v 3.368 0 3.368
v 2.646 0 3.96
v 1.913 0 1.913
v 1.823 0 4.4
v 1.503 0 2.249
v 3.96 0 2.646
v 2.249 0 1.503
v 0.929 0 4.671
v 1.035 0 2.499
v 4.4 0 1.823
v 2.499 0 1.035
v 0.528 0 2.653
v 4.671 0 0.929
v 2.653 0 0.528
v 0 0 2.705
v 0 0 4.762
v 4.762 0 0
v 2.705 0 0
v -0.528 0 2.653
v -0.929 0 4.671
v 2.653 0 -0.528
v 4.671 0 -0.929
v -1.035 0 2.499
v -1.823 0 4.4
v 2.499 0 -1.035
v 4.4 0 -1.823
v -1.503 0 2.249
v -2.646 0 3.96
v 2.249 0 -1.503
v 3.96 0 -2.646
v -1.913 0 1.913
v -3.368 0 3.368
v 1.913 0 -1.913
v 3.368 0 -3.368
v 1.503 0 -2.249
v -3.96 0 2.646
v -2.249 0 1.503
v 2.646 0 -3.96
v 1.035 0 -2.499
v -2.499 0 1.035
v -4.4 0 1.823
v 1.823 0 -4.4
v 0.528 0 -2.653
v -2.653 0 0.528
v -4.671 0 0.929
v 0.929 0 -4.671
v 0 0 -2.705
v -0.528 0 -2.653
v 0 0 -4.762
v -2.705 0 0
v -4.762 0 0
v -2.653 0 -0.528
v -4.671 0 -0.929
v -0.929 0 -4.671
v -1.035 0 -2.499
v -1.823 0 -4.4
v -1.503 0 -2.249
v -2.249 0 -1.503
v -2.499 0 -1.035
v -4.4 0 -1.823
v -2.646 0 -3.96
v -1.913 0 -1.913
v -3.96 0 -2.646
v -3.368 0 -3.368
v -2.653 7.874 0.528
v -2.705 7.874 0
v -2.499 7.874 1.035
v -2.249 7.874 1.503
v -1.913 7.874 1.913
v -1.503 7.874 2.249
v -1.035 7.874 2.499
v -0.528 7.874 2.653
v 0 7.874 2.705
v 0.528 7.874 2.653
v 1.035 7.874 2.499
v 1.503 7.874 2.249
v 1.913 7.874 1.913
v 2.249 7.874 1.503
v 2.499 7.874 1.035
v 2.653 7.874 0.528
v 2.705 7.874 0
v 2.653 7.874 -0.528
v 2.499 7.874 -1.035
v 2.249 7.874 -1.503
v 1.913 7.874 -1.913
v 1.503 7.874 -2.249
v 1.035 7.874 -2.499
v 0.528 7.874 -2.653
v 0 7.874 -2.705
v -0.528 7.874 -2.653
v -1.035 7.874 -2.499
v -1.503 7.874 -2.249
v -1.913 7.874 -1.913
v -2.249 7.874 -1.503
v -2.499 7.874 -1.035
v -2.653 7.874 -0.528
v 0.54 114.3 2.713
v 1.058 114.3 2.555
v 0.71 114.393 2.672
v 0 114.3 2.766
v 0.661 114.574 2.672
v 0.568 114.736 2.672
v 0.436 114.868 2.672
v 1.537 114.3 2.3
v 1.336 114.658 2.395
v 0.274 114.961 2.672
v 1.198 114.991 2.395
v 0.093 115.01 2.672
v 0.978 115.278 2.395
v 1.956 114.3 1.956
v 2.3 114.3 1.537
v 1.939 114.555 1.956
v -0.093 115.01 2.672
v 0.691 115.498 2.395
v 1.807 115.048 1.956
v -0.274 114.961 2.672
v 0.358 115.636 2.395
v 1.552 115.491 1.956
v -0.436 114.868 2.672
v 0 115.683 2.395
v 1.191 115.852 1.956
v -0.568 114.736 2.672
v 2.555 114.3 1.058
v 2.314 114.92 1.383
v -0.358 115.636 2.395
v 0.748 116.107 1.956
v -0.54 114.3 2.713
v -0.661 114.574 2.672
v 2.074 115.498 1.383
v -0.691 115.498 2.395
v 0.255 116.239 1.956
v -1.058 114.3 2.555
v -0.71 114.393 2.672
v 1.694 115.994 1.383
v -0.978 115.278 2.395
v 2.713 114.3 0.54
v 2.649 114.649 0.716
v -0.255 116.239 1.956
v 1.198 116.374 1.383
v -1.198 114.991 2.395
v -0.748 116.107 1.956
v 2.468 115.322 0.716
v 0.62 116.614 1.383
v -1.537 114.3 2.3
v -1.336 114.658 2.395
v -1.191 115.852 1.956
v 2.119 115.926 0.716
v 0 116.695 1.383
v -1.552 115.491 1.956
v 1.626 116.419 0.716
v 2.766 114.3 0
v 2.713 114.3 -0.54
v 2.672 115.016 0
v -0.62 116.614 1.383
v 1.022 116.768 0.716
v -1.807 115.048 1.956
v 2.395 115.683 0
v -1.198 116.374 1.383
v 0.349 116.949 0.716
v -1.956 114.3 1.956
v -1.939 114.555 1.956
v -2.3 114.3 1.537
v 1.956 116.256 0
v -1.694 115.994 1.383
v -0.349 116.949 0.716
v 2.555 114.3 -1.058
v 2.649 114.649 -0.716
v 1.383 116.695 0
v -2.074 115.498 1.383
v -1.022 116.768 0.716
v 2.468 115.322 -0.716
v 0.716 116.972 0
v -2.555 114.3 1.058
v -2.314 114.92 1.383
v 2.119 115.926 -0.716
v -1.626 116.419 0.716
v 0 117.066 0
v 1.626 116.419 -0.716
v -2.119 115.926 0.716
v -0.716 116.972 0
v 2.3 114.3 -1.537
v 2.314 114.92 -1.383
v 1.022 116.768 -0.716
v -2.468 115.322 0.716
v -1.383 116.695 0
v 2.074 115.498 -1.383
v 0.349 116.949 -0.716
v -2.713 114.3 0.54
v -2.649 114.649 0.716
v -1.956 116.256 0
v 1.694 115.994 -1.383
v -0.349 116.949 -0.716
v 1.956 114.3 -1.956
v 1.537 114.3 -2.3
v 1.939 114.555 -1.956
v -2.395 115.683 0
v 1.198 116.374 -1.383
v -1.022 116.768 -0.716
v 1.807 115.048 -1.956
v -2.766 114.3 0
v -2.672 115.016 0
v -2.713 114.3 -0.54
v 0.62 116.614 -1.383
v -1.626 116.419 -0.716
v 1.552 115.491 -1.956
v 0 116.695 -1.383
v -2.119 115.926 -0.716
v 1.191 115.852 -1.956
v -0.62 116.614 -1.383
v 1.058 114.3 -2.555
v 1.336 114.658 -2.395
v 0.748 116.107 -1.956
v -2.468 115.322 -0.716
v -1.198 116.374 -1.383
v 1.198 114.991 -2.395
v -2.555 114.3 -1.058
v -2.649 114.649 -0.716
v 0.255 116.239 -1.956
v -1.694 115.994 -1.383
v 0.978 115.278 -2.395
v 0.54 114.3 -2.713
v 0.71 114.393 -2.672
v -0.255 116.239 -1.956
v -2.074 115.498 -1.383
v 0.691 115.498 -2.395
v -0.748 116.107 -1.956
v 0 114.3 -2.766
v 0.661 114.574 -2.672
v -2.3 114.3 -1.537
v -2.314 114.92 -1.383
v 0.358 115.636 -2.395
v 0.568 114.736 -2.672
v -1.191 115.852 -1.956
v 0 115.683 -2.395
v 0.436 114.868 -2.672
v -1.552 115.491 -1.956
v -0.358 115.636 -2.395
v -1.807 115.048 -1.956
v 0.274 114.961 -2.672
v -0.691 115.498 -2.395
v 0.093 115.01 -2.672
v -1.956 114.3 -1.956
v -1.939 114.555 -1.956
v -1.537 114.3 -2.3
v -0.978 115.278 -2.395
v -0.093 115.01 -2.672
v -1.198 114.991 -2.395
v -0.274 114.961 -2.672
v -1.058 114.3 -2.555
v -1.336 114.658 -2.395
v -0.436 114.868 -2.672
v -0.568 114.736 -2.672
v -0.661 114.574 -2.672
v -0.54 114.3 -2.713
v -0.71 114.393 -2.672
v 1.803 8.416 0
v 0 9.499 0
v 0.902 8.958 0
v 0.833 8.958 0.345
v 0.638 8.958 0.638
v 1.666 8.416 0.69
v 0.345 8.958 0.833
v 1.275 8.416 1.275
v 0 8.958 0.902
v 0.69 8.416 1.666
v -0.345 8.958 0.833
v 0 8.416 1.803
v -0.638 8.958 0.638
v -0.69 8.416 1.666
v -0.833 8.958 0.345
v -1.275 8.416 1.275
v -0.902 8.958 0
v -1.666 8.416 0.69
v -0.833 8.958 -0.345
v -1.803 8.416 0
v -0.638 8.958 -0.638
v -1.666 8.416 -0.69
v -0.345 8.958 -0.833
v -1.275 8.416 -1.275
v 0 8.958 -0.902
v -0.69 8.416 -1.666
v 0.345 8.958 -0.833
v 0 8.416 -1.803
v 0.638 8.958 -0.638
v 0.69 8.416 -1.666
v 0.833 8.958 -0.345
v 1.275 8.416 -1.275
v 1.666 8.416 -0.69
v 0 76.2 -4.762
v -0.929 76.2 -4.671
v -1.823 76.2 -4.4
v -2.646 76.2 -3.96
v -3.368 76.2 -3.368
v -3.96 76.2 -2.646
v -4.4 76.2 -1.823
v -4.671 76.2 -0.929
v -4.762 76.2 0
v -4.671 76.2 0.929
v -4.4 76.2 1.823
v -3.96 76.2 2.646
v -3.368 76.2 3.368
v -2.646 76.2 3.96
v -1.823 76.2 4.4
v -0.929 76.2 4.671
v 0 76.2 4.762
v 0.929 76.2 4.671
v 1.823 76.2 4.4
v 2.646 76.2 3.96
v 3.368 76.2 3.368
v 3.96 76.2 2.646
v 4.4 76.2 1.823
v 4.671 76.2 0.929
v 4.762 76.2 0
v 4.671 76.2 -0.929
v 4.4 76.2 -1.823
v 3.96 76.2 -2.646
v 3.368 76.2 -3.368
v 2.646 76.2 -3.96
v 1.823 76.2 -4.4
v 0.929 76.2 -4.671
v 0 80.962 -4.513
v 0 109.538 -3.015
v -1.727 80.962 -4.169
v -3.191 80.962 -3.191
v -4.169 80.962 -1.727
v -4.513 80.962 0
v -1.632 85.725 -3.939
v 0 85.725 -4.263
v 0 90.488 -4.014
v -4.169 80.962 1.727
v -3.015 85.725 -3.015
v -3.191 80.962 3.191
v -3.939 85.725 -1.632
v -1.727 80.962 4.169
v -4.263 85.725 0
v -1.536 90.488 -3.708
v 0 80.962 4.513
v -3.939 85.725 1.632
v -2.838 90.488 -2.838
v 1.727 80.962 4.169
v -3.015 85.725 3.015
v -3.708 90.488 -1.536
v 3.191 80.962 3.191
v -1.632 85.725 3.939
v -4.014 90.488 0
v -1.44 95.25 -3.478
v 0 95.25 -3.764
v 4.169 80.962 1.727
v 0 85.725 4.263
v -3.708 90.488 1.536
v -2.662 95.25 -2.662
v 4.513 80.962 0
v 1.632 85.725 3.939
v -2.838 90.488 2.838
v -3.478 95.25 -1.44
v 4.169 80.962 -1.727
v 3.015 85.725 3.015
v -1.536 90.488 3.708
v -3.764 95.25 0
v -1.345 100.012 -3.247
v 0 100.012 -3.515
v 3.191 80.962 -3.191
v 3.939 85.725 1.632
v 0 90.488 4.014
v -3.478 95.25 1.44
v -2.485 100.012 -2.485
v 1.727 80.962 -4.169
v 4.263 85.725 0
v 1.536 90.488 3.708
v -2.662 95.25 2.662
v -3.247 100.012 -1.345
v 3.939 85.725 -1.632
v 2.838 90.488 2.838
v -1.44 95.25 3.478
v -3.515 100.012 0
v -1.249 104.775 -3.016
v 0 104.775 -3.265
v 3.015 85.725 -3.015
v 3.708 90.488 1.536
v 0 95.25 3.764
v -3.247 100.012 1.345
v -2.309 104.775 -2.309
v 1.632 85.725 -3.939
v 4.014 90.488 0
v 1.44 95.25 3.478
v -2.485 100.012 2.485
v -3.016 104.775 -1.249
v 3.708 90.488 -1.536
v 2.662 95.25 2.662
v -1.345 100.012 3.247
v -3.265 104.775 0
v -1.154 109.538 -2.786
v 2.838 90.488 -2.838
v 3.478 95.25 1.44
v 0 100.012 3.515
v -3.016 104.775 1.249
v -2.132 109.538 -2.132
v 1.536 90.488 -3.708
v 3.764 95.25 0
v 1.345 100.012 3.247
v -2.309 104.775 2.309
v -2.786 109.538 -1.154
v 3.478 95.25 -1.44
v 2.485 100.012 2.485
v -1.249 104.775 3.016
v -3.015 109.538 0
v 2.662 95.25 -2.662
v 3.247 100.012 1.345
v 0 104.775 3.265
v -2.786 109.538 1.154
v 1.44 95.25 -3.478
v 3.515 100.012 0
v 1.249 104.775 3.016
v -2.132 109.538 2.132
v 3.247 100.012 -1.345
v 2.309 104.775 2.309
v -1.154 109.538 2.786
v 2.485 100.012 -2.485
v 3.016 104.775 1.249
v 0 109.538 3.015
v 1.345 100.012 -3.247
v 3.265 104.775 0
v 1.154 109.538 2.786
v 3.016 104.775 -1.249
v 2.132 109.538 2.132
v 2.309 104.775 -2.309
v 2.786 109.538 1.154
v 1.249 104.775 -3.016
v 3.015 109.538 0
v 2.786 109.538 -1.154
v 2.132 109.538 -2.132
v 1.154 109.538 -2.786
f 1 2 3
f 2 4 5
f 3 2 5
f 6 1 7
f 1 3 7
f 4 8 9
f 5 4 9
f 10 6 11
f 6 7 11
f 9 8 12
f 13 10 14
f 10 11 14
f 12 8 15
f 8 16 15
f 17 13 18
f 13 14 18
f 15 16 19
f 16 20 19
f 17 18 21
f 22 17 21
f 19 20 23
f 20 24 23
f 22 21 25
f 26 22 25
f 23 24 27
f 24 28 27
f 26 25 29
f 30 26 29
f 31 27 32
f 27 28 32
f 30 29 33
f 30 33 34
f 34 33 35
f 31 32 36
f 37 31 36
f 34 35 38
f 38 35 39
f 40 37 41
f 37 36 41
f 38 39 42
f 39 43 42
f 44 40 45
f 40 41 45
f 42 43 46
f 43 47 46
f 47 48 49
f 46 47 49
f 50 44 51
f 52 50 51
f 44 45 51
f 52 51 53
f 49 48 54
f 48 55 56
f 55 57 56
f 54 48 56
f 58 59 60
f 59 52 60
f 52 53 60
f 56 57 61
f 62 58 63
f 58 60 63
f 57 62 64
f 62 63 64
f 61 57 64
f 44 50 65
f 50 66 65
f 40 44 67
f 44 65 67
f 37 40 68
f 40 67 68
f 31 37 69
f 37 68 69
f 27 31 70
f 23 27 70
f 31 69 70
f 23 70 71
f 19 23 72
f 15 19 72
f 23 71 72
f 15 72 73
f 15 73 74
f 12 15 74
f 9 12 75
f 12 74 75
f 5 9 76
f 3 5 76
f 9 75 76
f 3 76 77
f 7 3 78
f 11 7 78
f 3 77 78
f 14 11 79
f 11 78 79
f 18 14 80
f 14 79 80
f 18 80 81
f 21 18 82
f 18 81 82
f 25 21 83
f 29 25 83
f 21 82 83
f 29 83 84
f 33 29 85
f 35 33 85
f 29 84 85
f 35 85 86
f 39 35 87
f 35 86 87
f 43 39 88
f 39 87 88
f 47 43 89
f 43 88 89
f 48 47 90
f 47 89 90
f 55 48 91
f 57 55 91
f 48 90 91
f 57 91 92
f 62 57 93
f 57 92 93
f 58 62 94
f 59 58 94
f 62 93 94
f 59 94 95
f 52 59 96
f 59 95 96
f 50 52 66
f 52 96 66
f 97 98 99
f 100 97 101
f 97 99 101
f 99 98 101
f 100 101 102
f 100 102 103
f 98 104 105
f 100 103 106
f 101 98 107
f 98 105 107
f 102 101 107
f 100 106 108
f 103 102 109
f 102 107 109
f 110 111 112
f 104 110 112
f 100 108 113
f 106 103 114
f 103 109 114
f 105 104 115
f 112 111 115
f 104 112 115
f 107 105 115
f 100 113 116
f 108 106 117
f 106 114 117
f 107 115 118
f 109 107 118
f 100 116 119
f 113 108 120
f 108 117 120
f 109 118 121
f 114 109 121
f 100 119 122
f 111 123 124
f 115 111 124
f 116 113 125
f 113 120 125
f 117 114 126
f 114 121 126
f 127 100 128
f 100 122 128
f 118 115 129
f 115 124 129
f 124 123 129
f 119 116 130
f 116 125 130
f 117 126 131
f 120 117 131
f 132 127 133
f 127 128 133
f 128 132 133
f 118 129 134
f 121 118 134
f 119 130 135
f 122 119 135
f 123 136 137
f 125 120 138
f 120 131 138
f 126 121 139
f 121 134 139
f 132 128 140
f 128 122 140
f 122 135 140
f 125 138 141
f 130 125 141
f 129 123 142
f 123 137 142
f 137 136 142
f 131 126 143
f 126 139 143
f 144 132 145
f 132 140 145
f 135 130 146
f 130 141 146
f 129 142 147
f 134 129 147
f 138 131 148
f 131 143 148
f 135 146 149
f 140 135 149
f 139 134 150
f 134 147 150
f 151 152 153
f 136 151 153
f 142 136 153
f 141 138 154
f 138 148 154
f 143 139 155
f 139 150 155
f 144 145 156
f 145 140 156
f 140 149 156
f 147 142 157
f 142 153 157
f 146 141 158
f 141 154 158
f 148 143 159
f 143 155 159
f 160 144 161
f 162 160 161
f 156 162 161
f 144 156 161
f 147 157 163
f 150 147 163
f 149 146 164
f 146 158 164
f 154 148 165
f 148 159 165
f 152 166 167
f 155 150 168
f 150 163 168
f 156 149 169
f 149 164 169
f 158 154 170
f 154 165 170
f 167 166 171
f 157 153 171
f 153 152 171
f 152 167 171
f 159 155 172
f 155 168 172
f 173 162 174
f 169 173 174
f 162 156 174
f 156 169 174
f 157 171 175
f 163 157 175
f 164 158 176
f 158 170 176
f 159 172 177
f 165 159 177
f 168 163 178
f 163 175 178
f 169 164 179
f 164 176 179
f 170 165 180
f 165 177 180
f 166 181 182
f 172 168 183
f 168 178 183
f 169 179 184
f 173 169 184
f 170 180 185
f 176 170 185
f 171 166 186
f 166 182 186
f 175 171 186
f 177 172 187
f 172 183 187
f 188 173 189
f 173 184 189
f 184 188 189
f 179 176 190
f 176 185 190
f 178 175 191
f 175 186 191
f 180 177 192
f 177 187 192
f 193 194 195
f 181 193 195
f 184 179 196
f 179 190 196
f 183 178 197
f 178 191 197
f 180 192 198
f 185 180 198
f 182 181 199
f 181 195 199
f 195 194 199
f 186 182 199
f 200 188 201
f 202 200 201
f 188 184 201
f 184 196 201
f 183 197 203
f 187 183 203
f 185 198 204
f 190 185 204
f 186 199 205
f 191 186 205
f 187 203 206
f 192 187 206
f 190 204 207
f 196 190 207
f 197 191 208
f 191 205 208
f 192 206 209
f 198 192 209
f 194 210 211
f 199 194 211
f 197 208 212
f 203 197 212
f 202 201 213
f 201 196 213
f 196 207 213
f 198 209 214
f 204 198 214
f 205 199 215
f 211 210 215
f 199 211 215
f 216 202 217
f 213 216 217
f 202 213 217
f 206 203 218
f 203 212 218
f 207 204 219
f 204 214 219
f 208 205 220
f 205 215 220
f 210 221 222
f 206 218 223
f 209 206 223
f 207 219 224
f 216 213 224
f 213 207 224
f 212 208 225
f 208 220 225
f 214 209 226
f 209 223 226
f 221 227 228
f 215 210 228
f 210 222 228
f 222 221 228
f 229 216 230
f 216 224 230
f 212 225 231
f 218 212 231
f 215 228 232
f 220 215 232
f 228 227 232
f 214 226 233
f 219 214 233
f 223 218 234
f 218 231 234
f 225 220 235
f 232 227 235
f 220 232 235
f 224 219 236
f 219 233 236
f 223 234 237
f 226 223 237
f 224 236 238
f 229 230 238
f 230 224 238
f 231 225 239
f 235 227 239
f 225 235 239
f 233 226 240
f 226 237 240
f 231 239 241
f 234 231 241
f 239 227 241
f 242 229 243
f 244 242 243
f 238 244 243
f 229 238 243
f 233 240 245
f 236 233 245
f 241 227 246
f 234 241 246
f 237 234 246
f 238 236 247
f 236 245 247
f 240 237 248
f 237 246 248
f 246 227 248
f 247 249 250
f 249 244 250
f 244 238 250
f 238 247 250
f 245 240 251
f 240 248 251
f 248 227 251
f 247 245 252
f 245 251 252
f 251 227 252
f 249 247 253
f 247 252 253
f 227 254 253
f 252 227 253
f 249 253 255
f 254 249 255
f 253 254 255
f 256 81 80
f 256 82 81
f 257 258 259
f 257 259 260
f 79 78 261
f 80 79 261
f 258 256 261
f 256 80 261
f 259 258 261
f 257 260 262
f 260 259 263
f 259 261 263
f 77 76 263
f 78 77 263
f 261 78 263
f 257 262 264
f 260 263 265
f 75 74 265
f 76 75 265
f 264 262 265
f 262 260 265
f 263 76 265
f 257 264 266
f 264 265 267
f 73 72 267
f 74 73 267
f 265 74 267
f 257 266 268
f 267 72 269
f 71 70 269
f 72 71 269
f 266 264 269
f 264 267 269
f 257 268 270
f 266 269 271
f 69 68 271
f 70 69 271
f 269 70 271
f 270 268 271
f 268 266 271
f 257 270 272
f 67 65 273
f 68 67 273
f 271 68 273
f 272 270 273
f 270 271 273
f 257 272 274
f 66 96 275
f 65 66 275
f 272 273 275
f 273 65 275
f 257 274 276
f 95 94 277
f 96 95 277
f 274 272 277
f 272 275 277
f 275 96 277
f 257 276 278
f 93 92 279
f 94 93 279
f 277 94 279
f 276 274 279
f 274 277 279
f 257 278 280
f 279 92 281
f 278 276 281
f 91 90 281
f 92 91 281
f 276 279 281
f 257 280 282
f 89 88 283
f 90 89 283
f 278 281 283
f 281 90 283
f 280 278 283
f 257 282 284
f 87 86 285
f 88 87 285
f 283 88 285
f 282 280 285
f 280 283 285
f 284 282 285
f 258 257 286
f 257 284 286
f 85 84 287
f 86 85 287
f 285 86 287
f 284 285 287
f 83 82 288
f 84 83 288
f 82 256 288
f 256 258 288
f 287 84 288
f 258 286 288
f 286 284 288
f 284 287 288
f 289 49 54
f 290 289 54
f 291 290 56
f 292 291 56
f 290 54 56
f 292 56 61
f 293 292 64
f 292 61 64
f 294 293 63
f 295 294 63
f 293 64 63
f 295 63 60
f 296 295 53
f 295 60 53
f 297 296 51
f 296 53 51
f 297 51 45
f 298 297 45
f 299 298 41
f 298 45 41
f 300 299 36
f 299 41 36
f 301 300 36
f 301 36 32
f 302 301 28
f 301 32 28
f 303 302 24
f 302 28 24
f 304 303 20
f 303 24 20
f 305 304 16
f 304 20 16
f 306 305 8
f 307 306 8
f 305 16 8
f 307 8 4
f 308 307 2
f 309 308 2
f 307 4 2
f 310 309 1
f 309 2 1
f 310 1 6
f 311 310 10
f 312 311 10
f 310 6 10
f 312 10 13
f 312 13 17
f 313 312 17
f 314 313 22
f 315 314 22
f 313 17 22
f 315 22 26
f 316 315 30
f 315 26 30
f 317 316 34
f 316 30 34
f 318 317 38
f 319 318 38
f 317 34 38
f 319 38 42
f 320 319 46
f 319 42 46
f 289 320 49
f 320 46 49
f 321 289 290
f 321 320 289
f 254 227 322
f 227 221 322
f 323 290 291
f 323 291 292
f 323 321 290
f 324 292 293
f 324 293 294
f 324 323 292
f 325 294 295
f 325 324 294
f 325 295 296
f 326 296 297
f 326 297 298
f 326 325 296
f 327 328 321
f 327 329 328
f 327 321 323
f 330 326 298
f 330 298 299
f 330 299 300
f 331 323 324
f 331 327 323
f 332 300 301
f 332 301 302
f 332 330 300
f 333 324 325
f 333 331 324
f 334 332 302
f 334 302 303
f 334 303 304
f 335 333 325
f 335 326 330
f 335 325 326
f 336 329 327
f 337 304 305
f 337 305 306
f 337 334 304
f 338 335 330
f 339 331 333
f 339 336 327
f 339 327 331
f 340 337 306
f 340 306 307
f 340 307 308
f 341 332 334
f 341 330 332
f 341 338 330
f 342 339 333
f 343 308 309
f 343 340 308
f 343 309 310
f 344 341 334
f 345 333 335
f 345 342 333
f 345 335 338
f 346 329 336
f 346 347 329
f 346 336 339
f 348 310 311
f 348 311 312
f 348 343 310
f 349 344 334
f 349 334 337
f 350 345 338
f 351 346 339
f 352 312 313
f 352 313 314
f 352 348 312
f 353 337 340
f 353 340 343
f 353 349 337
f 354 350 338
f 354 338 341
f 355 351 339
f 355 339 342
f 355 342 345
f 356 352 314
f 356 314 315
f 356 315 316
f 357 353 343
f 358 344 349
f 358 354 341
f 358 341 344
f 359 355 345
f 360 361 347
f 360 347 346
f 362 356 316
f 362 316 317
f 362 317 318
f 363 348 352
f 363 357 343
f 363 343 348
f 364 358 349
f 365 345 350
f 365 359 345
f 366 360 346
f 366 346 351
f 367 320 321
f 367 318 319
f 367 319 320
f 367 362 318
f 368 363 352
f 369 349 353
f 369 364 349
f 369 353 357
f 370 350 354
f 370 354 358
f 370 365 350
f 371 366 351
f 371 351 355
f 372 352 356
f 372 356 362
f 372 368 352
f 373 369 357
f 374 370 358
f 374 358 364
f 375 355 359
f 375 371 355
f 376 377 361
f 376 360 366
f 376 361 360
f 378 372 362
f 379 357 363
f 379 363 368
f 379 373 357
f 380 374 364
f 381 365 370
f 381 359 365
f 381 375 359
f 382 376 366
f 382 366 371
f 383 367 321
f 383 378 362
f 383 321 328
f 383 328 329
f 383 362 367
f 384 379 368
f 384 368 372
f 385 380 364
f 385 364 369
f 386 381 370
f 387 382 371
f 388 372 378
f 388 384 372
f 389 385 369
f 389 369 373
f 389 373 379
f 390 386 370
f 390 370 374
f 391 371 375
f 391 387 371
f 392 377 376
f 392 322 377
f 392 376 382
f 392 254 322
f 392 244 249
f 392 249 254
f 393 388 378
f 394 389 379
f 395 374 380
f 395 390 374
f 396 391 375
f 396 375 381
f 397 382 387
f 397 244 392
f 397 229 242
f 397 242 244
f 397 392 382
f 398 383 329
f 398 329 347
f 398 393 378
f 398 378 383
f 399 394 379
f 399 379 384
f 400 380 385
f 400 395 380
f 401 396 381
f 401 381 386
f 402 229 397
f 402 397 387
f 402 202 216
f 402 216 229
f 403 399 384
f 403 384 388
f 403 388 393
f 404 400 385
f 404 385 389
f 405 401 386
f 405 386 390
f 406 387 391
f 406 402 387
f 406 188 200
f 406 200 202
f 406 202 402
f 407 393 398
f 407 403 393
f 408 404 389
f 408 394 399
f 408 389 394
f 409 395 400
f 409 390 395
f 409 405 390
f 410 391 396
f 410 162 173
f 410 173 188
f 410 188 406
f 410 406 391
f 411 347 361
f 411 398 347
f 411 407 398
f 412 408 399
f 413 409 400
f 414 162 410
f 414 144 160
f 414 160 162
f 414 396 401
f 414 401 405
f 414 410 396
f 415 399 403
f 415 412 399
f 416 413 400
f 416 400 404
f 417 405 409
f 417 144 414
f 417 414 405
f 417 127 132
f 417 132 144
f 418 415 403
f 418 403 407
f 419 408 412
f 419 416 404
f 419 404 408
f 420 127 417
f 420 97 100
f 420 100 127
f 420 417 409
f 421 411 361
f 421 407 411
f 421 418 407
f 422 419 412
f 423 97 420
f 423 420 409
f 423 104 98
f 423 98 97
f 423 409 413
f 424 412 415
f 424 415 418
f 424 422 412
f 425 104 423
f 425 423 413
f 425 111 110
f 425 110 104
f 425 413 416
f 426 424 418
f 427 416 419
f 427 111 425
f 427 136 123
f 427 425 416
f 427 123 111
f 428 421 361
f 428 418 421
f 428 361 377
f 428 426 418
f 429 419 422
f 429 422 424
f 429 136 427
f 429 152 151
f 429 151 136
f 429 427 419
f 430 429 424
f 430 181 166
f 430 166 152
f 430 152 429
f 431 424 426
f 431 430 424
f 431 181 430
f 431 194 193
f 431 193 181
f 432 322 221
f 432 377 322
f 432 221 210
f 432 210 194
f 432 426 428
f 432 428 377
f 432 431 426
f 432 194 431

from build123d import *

# Parameters (mm, degrees)
SKETCH1_R                   = 4.7625
BOSS_EXTRUDE1_DEPTH         = 76.2
SKETCH2_R                   = 4.7625
BOSS_EXTRUDE2_DEPTH         = 38.1
BOSS_EXTRUDE2_TAPER         = 3
F_1_4_28_TAPPED_HOLE1_D     = 5.4102
F_1_4_28_TAPPED_HOLE1_DEPTH = 7.874
F_1_4_28_TAPPED_HOLE1_TIP   = 1.625388061


with BuildPart() as part:
    # Sketch1 → Boss-Extrude1 (new body)
    with BuildSketch(Plane(origin=(0, 0, 0), x_dir=(1, 0, 0), z_dir=(0, 1, 0))):
        with Locations(Location((0, 0, 0), (0, 0, 90))):
            Circle(SKETCH1_R)
    extrude(amount=BOSS_EXTRUDE1_DEPTH)

    # Sketch2 → Boss-Extrude2 (add)
    with BuildSketch(Plane(origin=(0, 76.2, 0), x_dir=(1, 0, 0), z_dir=(0, 1, 0))):
        with Locations(Location((0, 0, 0), (0, 0, 90))):
            Circle(SKETCH2_R)
    extrude(amount=BOSS_EXTRUDE2_DEPTH, taper=BOSS_EXTRUDE2_TAPER)

    # Sketch3 → Revolve1 (revolve)
    with BuildSketch(Plane(origin=(0, 114.3, 0), x_dir=(1, 0, 0), z_dir=(0, 1, 0))):
        with BuildLine():
            Line((0, 2.765763609), (0, -2.765763609))
            ThreePointArc((0, -2.765763609), (2.765763609, 0), (0, 2.765763609))
        make_face()
    revolve(axis=Axis((0, 114.3, -2.765763609), (0, 0, 1)))

    # 1/4-28 Tapped Hole1
    with Locations(Plane.XZ):
        with Locations((0, 0)):
            Hole(F_1_4_28_TAPPED_HOLE1_D / 2, depth=F_1_4_28_TAPPED_HOLE1_DEPTH)
            with Locations((0, 0, -(F_1_4_28_TAPPED_HOLE1_DEPTH + F_1_4_28_TAPPED_HOLE1_TIP / 2))):  # 118° drill point
                Cone(0, F_1_4_28_TAPPED_HOLE1_D / 2, F_1_4_28_TAPPED_HOLE1_TIP, mode=Mode.SUBTRACT)


solid = part.part
